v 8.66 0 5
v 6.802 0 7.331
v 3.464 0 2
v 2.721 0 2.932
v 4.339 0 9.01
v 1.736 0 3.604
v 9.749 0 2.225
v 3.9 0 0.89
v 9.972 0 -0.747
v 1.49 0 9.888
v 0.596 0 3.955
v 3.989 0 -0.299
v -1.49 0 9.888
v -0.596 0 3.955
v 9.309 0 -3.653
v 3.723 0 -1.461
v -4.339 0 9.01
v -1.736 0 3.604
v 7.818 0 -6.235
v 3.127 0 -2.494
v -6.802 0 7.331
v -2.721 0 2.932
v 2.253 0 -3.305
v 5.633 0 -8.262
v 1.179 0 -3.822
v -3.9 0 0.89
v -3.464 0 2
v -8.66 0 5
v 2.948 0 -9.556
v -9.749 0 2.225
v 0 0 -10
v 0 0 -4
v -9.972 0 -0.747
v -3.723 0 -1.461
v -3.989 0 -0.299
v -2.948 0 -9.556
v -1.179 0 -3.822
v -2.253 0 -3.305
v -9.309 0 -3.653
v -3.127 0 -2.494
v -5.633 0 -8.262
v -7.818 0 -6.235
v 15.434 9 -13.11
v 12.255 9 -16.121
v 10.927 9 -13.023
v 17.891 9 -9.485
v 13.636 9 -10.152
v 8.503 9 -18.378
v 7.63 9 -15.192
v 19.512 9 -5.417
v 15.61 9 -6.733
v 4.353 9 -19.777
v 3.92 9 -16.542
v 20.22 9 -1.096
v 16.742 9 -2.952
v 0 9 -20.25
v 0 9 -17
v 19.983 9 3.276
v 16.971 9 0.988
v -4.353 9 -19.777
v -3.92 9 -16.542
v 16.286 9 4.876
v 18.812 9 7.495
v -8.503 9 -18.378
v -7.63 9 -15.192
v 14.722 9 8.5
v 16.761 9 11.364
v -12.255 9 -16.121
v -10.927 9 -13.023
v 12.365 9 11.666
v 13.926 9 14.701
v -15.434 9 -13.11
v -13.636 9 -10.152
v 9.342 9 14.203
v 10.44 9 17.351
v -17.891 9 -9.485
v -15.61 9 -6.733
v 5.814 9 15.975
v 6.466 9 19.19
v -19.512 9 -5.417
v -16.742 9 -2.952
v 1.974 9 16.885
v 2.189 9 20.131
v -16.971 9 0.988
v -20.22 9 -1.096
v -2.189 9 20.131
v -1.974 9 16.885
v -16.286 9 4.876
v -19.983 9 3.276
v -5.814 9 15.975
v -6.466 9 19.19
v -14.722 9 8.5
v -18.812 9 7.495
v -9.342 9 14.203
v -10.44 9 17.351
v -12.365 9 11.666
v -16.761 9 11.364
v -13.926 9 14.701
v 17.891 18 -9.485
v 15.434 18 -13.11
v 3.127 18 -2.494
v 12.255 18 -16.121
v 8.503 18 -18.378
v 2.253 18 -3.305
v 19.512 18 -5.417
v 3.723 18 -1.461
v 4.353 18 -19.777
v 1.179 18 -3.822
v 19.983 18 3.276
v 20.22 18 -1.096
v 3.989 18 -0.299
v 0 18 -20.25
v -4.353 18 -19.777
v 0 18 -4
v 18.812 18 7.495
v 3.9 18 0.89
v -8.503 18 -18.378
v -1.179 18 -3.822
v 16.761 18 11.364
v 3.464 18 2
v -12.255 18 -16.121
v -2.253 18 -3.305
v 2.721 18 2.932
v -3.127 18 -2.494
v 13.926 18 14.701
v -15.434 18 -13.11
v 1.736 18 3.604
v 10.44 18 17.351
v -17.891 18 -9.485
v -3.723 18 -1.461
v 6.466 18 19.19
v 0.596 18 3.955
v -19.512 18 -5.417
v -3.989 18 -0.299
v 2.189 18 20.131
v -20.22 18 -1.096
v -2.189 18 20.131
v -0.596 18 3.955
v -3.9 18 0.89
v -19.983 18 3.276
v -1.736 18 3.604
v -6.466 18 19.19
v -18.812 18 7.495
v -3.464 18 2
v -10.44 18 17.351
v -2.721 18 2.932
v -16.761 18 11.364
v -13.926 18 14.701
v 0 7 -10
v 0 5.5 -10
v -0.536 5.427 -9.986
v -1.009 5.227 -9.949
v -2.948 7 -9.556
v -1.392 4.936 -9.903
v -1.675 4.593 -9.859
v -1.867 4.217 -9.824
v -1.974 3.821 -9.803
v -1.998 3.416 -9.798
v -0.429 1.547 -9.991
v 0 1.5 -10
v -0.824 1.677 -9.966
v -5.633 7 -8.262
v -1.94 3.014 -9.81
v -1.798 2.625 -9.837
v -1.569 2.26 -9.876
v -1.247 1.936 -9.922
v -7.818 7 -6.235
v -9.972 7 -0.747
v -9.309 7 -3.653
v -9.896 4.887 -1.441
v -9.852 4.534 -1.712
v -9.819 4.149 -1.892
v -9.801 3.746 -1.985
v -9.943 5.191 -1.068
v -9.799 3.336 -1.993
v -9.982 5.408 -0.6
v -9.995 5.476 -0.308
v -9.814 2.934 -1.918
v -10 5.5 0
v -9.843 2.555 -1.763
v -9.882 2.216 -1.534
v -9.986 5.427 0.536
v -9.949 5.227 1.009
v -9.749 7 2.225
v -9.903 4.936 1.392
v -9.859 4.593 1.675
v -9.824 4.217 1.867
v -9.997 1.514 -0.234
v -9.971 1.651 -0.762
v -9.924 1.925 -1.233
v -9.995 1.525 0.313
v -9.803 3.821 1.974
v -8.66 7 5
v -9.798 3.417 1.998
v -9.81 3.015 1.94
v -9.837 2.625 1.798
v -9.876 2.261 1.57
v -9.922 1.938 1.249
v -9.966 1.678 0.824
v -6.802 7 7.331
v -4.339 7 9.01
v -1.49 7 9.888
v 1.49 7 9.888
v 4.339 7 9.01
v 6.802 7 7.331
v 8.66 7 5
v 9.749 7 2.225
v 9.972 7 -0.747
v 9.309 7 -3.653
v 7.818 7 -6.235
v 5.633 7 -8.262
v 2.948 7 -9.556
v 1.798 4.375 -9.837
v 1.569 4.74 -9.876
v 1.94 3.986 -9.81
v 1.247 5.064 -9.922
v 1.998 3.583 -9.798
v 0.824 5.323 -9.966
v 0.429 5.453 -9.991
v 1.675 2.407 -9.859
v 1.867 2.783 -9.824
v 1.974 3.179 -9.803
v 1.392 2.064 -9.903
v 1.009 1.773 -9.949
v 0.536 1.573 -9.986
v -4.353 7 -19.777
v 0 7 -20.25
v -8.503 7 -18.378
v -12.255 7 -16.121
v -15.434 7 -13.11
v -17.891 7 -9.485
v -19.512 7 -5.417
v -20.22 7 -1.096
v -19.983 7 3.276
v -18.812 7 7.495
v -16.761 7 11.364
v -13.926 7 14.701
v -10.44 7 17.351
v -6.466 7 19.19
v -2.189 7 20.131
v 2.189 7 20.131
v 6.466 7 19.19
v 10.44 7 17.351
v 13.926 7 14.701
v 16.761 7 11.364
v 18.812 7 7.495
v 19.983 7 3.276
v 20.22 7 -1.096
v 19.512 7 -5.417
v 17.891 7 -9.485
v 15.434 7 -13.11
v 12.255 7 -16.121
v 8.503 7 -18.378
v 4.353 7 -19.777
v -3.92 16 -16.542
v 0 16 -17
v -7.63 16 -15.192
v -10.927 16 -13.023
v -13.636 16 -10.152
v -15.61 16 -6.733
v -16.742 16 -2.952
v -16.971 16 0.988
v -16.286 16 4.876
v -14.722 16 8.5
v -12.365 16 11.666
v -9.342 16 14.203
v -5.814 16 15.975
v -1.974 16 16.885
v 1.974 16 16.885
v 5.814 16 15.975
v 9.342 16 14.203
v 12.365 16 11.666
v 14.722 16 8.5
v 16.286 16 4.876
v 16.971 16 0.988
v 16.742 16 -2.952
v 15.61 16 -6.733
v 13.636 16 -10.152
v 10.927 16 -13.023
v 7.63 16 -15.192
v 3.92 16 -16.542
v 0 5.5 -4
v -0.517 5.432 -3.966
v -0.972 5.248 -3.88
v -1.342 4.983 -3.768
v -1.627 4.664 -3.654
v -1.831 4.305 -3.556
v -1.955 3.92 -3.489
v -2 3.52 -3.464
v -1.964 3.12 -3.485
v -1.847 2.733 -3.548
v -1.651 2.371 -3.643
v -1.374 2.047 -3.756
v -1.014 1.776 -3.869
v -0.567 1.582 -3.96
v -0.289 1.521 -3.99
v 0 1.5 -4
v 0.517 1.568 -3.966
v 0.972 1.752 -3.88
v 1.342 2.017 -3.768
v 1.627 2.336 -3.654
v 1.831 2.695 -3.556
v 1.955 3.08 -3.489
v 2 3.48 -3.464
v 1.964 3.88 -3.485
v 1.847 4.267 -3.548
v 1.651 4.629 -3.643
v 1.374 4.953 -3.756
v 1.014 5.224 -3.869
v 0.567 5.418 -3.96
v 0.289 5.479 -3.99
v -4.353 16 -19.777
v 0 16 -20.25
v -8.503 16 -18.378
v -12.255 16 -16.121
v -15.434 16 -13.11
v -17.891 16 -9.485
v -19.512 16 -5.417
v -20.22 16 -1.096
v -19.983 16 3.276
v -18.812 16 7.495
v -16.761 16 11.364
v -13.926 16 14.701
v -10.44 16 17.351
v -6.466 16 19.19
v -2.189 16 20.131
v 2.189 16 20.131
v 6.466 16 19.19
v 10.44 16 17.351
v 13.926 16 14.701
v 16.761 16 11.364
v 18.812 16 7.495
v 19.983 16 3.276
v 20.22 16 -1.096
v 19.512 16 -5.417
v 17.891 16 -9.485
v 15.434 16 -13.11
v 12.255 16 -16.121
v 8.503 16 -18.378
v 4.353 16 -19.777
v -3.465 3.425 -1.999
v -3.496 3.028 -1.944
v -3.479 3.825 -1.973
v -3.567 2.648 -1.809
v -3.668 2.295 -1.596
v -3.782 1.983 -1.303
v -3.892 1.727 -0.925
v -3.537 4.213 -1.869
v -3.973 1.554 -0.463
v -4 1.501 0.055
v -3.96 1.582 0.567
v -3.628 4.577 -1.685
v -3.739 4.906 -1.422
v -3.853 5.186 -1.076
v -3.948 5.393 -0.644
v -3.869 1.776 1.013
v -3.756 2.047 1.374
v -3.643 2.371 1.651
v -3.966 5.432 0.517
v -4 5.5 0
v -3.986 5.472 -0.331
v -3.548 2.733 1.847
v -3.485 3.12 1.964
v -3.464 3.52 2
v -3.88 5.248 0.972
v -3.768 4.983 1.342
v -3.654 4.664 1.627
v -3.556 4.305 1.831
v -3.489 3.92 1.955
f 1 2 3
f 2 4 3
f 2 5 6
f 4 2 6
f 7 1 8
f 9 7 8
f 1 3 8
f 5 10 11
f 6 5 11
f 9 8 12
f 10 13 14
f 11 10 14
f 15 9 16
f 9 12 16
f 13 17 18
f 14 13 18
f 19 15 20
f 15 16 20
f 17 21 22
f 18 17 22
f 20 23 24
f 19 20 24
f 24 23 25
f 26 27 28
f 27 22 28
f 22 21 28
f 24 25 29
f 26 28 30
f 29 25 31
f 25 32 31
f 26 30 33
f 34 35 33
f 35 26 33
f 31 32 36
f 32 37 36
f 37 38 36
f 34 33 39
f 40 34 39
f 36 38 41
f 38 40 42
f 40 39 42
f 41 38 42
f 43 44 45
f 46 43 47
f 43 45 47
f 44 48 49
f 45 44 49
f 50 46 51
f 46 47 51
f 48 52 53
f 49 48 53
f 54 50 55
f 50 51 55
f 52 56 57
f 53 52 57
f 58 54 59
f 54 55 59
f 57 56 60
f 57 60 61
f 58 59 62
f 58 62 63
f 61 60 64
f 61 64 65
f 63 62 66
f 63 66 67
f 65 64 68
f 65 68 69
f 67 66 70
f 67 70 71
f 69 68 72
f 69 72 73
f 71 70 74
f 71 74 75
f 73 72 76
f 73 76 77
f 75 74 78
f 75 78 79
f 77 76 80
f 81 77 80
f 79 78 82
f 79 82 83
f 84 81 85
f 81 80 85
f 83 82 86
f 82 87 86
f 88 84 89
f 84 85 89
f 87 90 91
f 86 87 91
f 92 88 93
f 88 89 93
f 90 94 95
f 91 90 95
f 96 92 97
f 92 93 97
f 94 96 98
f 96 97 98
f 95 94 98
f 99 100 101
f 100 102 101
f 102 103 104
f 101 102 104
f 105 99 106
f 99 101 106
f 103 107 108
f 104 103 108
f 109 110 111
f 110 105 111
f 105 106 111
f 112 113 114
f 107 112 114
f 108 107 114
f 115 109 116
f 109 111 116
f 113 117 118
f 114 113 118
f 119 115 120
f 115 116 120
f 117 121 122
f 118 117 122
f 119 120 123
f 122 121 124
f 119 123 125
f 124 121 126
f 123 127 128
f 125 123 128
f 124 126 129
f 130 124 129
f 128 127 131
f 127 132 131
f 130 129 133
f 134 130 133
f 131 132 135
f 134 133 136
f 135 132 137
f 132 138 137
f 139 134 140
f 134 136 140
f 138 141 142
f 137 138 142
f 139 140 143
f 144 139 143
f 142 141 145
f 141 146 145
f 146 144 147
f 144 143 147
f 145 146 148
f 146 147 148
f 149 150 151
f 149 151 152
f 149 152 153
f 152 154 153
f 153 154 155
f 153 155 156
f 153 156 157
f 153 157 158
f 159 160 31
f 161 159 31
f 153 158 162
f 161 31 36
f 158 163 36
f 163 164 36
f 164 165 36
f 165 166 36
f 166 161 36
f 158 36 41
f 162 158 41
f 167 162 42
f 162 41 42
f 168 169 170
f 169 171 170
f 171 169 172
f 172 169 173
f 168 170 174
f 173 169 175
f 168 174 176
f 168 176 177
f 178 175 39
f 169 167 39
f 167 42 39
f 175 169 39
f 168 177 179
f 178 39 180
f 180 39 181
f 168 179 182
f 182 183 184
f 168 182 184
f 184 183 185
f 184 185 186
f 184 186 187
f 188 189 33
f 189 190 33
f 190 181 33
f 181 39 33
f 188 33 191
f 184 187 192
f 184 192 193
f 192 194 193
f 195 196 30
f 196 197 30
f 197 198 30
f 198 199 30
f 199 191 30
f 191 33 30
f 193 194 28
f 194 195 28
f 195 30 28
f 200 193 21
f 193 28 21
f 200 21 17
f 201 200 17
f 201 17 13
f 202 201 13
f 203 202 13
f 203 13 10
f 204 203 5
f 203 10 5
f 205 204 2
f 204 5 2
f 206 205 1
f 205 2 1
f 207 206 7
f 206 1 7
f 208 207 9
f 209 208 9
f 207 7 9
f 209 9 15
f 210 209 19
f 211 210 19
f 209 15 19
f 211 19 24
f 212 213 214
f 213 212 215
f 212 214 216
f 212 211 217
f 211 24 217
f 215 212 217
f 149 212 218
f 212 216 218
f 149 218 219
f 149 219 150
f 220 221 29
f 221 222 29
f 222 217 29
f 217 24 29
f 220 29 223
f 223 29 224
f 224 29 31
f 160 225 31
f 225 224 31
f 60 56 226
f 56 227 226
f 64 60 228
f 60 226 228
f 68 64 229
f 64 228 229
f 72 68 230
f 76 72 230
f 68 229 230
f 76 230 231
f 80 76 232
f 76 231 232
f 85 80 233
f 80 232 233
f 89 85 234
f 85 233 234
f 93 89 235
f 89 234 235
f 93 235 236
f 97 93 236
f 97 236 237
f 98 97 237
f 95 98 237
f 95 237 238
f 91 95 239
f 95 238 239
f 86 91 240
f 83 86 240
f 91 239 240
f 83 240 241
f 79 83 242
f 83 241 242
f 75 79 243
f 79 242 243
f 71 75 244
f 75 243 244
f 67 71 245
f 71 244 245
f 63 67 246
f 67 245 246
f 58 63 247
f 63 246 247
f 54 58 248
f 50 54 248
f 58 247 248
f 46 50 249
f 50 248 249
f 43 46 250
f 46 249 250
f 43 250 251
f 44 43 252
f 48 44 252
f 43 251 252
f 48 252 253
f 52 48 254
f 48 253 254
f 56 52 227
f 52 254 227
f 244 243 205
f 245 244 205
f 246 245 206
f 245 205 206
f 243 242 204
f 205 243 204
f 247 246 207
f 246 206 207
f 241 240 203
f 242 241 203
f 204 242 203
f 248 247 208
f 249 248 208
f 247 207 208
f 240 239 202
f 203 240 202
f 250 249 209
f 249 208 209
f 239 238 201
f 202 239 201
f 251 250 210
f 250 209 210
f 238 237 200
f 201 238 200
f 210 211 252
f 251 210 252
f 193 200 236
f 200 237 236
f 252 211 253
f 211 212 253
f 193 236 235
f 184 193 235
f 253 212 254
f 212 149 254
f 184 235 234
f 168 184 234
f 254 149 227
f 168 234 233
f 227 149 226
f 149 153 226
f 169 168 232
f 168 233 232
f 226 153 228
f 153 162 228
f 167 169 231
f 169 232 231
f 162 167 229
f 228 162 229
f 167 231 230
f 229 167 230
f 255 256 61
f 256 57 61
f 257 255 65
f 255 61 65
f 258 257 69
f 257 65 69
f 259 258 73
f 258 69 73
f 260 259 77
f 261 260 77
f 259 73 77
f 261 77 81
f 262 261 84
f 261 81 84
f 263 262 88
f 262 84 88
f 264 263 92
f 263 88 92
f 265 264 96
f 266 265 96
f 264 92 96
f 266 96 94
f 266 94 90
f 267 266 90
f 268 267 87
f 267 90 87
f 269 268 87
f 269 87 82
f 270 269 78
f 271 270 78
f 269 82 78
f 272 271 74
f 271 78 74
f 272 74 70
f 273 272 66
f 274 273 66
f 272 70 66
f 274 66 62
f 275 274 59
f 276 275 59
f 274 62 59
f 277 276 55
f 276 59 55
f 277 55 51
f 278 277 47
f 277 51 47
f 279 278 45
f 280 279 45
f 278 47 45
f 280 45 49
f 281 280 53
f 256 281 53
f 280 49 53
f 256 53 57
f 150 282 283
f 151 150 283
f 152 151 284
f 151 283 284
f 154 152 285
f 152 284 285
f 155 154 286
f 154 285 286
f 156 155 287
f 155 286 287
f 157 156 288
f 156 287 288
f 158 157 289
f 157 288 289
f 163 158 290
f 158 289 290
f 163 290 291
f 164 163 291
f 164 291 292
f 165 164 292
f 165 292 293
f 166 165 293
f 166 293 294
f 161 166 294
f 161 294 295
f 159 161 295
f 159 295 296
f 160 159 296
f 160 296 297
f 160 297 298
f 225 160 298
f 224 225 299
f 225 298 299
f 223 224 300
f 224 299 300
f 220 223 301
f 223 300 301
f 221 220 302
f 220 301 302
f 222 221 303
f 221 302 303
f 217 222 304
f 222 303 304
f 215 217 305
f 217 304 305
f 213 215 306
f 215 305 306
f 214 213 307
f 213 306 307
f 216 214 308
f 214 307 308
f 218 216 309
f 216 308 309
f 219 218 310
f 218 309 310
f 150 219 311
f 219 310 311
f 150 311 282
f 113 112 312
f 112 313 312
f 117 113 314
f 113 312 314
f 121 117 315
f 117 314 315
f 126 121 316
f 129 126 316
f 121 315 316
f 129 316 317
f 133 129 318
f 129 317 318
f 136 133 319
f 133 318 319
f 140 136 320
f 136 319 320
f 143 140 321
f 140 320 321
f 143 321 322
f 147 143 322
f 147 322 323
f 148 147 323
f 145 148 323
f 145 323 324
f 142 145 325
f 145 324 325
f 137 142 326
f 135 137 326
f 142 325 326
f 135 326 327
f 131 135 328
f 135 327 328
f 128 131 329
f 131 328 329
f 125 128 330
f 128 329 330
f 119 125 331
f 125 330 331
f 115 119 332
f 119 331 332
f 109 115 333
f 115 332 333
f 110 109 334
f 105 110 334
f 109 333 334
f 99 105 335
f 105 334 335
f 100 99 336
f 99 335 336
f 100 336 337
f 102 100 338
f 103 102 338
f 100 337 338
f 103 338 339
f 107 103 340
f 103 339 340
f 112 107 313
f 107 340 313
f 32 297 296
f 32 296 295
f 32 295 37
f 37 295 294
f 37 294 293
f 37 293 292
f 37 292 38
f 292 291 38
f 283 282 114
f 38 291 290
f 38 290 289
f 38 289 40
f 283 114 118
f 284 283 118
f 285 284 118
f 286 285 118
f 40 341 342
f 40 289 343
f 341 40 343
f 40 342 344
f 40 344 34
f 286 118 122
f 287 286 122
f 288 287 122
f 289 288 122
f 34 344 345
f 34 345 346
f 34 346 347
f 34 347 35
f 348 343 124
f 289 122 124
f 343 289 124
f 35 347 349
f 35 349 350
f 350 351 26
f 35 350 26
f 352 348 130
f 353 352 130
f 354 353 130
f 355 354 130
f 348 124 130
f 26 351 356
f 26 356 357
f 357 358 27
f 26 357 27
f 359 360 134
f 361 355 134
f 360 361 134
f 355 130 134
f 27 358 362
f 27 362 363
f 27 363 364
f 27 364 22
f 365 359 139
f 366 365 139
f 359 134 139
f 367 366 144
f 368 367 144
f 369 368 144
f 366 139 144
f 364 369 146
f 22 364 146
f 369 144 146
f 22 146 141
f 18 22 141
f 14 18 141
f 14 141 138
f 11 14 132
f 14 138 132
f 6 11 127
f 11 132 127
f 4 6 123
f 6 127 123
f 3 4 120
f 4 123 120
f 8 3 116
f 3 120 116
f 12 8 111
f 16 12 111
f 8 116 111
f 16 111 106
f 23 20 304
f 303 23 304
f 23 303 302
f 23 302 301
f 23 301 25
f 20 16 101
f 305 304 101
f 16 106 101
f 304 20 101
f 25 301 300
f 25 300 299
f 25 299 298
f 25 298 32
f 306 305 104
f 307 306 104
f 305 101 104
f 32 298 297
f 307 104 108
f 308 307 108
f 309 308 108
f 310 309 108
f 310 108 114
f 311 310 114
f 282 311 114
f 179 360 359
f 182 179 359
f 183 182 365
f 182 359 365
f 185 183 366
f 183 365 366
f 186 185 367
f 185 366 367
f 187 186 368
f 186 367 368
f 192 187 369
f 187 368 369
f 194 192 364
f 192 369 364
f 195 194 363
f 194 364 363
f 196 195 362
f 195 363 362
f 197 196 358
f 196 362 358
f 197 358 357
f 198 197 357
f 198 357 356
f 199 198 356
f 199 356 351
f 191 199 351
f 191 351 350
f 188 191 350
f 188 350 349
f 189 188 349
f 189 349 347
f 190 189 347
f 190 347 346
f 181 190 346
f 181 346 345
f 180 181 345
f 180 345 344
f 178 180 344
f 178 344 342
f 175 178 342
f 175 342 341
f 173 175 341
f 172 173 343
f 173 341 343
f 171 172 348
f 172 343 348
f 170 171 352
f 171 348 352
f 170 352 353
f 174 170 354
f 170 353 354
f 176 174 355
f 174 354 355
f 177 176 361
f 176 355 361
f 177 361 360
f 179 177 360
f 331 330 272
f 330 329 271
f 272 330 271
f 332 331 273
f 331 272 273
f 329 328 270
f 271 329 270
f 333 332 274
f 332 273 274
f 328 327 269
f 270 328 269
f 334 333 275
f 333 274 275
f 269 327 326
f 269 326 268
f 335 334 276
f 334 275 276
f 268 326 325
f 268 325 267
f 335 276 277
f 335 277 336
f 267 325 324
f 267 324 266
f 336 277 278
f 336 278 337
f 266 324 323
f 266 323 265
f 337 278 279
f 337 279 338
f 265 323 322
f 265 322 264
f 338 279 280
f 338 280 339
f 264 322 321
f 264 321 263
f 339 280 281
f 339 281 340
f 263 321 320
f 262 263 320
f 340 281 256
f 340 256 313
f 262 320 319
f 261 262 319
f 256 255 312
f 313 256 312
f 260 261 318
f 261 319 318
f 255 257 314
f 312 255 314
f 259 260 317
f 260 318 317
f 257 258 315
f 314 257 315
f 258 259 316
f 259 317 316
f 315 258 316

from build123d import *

# Parameters (mm, degrees)
SKETCH2_R          = 2
CUT_EXTRUDE1_DEPTH = 34.824916851
CIRPATTERN1_COUNT  = 2
CIRPATTERN1_ANGLE  = 90


with BuildPart() as part:
    # Sketch1 → Revolve1 (revolve)
    with BuildSketch(Plane.XY, mode=Mode.PRIVATE) as revolve1_sk:
        Polygon((-4, 0), (-4, 18), (-20.25, 18), (-20.25, 16), (-17, 16), (-17, 9), (-20.25, 9), (-20.25, 7), (-10, 7), (-10, 0), align=None)
    revolve(revolve1_sk.sketch.rotate(Axis((0, 0, 0), (0, 1, 0)), 270), axis=Axis((0, 0, 0), (0, 1, 0)))

    # Sketch2 → Cut-Extrude1 (cut, through all)
    with BuildSketch(Plane.XY):
        with Locations(Location((0, 3.5, 0), (0, 0, 90))):
            Circle(SKETCH2_R)
    cut_extrude1 = extrude(amount=-CUT_EXTRUDE1_DEPTH, mode=Mode.SUBTRACT)

    # CirPattern1: Cut-Extrude1 ×2 about axis
    cirpattern1_axis = Axis((0, 0, 0), (0, 1, 0))
    for i in range(1, CIRPATTERN1_COUNT):
        add(cut_extrude1.rotate(cirpattern1_axis, i * CIRPATTERN1_ANGLE / (CIRPATTERN1_COUNT - 1)), mode=Mode.SUBTRACT)


solid = part.part
